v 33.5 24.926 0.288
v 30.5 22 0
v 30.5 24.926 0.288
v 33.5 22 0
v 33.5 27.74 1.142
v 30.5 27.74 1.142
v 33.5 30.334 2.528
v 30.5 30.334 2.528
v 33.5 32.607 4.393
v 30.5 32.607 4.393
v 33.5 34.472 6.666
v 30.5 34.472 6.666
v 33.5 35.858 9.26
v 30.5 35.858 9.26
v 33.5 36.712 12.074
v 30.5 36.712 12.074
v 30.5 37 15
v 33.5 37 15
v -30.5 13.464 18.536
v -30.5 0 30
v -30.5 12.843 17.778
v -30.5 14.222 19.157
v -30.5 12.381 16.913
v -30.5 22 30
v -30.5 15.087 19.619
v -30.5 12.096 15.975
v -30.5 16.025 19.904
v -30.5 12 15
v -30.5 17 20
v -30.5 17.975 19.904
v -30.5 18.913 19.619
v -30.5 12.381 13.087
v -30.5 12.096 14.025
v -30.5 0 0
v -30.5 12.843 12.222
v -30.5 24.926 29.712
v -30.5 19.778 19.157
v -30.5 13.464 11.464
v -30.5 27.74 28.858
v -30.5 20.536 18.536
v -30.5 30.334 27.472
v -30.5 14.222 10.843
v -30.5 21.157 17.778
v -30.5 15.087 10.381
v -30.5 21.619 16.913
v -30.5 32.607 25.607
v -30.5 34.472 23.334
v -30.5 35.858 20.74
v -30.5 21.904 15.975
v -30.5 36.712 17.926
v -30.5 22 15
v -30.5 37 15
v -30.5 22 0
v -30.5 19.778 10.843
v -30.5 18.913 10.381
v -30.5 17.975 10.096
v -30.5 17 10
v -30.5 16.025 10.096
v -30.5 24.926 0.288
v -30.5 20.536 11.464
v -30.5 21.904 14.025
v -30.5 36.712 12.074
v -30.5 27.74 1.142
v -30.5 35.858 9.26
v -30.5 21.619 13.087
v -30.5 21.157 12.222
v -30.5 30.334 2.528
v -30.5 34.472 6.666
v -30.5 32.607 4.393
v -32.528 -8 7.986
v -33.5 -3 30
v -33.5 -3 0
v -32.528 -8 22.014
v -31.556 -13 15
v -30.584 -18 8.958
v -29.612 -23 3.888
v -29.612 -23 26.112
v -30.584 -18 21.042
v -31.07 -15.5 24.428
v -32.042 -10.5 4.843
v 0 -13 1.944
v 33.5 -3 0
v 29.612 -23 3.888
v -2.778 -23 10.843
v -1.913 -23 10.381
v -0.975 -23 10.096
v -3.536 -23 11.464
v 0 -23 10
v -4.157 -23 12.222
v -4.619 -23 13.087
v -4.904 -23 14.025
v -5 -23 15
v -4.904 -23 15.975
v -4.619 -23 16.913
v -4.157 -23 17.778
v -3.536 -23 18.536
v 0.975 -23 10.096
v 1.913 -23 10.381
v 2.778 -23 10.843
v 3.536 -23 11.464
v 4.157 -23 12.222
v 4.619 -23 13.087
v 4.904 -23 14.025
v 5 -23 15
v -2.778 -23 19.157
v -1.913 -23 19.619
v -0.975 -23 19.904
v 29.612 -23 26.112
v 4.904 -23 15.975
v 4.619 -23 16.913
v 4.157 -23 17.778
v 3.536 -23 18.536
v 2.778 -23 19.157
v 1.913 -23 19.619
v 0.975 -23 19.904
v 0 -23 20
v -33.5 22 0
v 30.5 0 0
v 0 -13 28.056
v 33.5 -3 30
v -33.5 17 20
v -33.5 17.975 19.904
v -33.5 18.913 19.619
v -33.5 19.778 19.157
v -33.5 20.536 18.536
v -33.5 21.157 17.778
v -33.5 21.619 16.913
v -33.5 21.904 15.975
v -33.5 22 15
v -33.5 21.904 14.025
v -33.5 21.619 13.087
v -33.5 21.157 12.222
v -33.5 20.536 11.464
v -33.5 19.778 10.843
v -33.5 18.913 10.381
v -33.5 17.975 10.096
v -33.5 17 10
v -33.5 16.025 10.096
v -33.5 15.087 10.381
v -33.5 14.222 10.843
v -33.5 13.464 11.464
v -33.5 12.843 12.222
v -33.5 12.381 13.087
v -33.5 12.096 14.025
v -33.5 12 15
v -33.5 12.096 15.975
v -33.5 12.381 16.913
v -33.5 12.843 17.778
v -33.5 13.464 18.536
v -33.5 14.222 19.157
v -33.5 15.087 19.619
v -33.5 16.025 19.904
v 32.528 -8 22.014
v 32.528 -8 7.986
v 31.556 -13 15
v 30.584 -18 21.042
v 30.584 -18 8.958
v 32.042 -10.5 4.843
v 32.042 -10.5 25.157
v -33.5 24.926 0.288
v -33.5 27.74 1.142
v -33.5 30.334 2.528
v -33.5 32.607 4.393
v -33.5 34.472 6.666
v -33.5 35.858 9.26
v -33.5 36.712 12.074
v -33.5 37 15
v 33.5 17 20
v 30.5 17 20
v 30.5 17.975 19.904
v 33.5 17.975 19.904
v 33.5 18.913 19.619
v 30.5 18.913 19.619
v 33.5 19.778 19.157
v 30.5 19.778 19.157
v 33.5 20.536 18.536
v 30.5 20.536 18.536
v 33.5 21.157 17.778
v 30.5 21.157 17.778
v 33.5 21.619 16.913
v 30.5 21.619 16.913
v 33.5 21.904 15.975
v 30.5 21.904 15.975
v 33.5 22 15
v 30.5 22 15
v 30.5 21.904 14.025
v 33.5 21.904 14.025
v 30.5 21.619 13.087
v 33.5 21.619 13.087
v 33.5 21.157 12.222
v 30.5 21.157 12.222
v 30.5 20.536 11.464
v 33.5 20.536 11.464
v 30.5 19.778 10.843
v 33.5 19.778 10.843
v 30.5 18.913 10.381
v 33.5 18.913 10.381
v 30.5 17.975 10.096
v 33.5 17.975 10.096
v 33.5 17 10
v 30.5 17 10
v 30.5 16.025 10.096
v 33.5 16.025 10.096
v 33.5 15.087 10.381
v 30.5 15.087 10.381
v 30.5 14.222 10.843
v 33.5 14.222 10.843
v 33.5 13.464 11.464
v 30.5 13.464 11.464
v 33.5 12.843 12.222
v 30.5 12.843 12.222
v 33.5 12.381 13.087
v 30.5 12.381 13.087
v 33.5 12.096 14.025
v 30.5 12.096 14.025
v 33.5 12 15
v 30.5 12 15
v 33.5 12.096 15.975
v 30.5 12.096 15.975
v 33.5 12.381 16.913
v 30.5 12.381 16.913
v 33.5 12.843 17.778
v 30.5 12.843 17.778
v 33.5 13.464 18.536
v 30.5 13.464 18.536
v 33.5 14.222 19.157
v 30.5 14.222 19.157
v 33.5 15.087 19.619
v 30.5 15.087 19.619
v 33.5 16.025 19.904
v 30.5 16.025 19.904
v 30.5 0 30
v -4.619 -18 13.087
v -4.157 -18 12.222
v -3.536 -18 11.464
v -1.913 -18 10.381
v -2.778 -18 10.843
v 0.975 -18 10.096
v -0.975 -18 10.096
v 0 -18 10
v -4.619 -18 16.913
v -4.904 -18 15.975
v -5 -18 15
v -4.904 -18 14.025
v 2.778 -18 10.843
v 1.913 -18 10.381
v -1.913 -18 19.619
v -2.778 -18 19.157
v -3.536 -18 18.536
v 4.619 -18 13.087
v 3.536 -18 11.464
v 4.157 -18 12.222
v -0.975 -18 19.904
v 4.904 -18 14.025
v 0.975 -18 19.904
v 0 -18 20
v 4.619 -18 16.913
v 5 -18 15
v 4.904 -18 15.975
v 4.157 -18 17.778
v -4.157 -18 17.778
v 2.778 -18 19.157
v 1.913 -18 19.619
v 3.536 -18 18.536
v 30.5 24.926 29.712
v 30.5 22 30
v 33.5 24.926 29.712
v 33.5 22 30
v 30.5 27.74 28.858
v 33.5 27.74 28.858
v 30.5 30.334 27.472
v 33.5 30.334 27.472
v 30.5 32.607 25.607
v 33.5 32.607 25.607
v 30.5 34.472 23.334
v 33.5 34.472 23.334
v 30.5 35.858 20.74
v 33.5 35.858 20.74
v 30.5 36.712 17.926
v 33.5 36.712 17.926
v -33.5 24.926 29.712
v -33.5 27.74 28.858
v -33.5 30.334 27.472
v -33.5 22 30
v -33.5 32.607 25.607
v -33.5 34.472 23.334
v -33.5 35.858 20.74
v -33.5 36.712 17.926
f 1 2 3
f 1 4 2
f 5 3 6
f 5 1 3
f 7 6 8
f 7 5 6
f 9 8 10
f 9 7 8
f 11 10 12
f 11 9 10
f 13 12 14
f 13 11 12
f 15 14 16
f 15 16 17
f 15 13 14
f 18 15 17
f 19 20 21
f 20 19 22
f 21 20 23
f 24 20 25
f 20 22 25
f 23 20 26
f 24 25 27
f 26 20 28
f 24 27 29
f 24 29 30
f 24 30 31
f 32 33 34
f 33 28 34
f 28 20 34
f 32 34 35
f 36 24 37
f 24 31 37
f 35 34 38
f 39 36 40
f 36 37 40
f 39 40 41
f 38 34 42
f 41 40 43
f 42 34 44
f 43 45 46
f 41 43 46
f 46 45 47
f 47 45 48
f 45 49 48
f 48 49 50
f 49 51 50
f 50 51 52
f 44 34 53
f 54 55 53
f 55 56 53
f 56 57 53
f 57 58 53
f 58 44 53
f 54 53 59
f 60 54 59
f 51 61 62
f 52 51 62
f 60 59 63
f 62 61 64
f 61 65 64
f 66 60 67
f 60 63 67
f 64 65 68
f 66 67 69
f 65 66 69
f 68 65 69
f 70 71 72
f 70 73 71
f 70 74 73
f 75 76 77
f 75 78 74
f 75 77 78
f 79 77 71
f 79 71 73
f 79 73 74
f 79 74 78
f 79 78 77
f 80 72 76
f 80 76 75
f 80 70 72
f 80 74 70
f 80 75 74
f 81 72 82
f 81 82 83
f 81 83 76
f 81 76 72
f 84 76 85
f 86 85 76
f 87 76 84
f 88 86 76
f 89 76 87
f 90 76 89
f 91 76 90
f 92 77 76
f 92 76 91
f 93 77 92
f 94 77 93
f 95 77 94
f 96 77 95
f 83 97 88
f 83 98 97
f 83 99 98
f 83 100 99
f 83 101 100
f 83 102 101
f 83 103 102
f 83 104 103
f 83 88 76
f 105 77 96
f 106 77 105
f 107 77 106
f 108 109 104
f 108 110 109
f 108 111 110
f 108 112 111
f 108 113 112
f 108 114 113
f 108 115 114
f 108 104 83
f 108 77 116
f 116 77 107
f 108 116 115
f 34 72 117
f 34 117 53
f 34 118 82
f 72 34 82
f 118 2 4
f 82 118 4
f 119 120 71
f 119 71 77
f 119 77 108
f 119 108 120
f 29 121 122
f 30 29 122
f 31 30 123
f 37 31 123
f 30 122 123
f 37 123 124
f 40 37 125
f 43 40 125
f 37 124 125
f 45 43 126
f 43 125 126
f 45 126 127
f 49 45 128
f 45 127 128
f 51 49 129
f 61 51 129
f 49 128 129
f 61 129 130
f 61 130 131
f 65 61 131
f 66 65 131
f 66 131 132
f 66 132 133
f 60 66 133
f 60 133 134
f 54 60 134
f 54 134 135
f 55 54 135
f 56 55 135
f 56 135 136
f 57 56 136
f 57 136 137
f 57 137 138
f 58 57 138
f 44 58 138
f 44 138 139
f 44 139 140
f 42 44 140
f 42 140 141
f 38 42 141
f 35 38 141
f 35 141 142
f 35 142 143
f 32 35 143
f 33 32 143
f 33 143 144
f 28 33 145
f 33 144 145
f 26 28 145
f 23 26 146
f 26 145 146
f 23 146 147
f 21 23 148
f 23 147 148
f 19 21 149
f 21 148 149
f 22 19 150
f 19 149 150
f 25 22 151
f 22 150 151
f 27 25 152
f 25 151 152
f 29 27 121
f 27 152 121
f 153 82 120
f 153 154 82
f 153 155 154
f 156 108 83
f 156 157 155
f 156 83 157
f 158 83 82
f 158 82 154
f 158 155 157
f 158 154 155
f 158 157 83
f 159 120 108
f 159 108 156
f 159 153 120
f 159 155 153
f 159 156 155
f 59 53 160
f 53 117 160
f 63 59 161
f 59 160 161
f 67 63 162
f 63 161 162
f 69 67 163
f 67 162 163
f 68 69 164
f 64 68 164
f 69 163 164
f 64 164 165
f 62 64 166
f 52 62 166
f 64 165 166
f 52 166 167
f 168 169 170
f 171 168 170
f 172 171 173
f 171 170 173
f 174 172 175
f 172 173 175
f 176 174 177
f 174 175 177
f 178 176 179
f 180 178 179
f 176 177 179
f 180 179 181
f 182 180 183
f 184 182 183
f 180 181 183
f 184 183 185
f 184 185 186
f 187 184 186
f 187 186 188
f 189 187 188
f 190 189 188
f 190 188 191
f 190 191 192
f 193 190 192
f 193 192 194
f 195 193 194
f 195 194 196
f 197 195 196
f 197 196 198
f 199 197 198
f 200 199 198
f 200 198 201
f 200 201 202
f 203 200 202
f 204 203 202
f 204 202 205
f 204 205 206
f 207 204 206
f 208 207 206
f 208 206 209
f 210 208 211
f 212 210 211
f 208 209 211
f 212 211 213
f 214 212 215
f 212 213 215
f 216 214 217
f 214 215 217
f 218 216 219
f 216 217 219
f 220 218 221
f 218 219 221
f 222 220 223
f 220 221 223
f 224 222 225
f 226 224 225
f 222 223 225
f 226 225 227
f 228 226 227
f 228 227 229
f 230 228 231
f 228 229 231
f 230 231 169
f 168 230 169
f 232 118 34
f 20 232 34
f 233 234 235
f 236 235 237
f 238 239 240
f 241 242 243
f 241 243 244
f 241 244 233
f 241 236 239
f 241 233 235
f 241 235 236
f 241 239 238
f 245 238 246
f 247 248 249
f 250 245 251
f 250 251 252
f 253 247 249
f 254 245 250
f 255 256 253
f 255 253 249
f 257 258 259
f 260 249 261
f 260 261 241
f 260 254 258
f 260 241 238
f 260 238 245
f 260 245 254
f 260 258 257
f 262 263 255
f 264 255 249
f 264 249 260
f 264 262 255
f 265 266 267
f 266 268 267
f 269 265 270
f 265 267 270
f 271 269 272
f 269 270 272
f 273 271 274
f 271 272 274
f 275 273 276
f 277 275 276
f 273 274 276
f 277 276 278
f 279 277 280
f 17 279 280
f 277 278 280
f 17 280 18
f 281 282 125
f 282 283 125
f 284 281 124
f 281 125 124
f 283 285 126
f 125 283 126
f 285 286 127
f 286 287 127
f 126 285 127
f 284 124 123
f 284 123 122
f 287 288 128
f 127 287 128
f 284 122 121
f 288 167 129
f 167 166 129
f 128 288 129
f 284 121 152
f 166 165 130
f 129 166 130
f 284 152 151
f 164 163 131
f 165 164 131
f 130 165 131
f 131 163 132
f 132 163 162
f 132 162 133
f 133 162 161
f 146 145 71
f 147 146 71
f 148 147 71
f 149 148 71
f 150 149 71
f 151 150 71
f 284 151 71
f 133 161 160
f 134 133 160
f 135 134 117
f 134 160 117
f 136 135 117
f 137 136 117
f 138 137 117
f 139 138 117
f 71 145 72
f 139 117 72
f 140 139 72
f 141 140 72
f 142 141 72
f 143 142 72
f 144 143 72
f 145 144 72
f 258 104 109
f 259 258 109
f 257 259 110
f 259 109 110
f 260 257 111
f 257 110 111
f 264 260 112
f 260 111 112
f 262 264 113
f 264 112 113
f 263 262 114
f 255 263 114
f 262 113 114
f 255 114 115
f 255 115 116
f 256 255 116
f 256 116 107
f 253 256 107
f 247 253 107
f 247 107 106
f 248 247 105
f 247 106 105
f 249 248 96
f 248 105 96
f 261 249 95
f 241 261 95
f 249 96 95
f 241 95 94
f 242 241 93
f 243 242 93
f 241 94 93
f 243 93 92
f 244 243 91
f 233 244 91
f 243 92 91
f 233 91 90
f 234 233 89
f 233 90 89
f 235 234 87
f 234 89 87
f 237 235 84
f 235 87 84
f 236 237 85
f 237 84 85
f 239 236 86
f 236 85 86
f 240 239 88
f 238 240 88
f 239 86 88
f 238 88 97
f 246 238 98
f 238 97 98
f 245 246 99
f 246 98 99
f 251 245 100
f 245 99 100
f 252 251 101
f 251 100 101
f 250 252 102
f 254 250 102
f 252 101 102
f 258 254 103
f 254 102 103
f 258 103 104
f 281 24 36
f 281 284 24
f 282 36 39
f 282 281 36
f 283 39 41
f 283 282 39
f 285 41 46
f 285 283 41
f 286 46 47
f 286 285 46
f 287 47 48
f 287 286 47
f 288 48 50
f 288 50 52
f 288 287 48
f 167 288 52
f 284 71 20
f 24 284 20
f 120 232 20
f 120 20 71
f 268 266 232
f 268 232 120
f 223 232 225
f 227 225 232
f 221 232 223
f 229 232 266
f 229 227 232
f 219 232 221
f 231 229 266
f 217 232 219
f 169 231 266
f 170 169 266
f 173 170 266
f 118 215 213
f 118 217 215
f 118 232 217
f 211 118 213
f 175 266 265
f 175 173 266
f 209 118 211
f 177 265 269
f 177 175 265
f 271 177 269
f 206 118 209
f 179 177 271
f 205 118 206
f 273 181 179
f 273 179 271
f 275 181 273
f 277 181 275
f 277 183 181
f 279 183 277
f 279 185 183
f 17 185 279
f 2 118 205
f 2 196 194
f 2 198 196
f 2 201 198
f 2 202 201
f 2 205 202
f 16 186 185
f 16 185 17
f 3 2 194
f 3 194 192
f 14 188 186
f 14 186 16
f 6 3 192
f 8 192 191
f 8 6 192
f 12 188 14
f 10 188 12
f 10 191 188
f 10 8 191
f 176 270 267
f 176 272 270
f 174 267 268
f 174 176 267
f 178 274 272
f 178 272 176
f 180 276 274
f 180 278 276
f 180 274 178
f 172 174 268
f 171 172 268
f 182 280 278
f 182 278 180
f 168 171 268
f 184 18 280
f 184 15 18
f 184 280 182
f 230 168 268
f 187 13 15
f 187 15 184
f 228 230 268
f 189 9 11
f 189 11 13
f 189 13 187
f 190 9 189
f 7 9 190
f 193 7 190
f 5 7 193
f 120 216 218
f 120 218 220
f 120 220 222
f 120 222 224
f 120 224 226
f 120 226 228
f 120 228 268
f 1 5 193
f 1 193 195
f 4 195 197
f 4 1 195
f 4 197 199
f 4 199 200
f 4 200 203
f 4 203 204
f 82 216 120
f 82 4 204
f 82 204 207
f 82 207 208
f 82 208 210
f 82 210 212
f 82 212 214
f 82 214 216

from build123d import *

# Parameters (mm, degrees)
BOSS_EXTRUDE1_DEPTH = 30
SKETCH2_R           = 5
CUT_EXTRUDE1_DEPTH  = 90
FILLET1_R           = 15
SKETCH3_W           = 67
SKETCH3_H           = 30
BOSS_EXTRUDE2_DEPTH = 20
BOSS_EXTRUDE2_TAPER = 11
SKETCH4_R           = 5
CUT_EXTRUDE2_DEPTH  = 5


with BuildPart() as part:
    # Sketch1 → Boss-Extrude1 (new body)
    with BuildSketch(Plane.XY):
        Polygon((0, 0), (30.5, 0), (30.5, 37), (33.5, 37), (33.5, -3), (0, -3), align=None)
    boss_extrude1 = extrude(amount=BOSS_EXTRUDE1_DEPTH)

    # Mirror1: Boss-Extrude1 across plane
    add(boss_extrude1.mirror(Plane(origin=(0, -3, 30), x_dir=(0, 0, 1), z_dir=(1, 0, 0))))

    # Sketch2 → Cut-Extrude1 (cut)
    with BuildSketch(Plane.ZY.offset(33.5)):
        with Locations((15, 17)):
            Circle(SKETCH2_R)
    extrude(amount=-CUT_EXTRUDE1_DEPTH, mode=Mode.SUBTRACT)

    # Fillet1
    fillet1_edges = [part.edges().sort_by_distance(p)[0] for p in [
        (-32, 37, 30),
        (-32, 37, 0),
        (32, 37, 0),
        (32, 37, 30),
    ]]
    fillet(fillet1_edges, radius=FILLET1_R - 0.0001)  # a hair under: the kernel refuses the full size

    # Sketch3 → Boss-Extrude2 (add)
    with BuildSketch(Plane.XZ.offset(3)):
        with Locations((0, 15)):
            Rectangle(SKETCH3_W, SKETCH3_H)
    extrude(amount=BOSS_EXTRUDE2_DEPTH, taper=BOSS_EXTRUDE2_TAPER)

    # Sketch4 → Cut-Extrude2 (cut)
    with BuildSketch(Plane.XZ.offset(23)):
        with Locations((0, 15)):
            Circle(SKETCH4_R)
    extrude(amount=-CUT_EXTRUDE2_DEPTH, mode=Mode.SUBTRACT)


solid = part.part
